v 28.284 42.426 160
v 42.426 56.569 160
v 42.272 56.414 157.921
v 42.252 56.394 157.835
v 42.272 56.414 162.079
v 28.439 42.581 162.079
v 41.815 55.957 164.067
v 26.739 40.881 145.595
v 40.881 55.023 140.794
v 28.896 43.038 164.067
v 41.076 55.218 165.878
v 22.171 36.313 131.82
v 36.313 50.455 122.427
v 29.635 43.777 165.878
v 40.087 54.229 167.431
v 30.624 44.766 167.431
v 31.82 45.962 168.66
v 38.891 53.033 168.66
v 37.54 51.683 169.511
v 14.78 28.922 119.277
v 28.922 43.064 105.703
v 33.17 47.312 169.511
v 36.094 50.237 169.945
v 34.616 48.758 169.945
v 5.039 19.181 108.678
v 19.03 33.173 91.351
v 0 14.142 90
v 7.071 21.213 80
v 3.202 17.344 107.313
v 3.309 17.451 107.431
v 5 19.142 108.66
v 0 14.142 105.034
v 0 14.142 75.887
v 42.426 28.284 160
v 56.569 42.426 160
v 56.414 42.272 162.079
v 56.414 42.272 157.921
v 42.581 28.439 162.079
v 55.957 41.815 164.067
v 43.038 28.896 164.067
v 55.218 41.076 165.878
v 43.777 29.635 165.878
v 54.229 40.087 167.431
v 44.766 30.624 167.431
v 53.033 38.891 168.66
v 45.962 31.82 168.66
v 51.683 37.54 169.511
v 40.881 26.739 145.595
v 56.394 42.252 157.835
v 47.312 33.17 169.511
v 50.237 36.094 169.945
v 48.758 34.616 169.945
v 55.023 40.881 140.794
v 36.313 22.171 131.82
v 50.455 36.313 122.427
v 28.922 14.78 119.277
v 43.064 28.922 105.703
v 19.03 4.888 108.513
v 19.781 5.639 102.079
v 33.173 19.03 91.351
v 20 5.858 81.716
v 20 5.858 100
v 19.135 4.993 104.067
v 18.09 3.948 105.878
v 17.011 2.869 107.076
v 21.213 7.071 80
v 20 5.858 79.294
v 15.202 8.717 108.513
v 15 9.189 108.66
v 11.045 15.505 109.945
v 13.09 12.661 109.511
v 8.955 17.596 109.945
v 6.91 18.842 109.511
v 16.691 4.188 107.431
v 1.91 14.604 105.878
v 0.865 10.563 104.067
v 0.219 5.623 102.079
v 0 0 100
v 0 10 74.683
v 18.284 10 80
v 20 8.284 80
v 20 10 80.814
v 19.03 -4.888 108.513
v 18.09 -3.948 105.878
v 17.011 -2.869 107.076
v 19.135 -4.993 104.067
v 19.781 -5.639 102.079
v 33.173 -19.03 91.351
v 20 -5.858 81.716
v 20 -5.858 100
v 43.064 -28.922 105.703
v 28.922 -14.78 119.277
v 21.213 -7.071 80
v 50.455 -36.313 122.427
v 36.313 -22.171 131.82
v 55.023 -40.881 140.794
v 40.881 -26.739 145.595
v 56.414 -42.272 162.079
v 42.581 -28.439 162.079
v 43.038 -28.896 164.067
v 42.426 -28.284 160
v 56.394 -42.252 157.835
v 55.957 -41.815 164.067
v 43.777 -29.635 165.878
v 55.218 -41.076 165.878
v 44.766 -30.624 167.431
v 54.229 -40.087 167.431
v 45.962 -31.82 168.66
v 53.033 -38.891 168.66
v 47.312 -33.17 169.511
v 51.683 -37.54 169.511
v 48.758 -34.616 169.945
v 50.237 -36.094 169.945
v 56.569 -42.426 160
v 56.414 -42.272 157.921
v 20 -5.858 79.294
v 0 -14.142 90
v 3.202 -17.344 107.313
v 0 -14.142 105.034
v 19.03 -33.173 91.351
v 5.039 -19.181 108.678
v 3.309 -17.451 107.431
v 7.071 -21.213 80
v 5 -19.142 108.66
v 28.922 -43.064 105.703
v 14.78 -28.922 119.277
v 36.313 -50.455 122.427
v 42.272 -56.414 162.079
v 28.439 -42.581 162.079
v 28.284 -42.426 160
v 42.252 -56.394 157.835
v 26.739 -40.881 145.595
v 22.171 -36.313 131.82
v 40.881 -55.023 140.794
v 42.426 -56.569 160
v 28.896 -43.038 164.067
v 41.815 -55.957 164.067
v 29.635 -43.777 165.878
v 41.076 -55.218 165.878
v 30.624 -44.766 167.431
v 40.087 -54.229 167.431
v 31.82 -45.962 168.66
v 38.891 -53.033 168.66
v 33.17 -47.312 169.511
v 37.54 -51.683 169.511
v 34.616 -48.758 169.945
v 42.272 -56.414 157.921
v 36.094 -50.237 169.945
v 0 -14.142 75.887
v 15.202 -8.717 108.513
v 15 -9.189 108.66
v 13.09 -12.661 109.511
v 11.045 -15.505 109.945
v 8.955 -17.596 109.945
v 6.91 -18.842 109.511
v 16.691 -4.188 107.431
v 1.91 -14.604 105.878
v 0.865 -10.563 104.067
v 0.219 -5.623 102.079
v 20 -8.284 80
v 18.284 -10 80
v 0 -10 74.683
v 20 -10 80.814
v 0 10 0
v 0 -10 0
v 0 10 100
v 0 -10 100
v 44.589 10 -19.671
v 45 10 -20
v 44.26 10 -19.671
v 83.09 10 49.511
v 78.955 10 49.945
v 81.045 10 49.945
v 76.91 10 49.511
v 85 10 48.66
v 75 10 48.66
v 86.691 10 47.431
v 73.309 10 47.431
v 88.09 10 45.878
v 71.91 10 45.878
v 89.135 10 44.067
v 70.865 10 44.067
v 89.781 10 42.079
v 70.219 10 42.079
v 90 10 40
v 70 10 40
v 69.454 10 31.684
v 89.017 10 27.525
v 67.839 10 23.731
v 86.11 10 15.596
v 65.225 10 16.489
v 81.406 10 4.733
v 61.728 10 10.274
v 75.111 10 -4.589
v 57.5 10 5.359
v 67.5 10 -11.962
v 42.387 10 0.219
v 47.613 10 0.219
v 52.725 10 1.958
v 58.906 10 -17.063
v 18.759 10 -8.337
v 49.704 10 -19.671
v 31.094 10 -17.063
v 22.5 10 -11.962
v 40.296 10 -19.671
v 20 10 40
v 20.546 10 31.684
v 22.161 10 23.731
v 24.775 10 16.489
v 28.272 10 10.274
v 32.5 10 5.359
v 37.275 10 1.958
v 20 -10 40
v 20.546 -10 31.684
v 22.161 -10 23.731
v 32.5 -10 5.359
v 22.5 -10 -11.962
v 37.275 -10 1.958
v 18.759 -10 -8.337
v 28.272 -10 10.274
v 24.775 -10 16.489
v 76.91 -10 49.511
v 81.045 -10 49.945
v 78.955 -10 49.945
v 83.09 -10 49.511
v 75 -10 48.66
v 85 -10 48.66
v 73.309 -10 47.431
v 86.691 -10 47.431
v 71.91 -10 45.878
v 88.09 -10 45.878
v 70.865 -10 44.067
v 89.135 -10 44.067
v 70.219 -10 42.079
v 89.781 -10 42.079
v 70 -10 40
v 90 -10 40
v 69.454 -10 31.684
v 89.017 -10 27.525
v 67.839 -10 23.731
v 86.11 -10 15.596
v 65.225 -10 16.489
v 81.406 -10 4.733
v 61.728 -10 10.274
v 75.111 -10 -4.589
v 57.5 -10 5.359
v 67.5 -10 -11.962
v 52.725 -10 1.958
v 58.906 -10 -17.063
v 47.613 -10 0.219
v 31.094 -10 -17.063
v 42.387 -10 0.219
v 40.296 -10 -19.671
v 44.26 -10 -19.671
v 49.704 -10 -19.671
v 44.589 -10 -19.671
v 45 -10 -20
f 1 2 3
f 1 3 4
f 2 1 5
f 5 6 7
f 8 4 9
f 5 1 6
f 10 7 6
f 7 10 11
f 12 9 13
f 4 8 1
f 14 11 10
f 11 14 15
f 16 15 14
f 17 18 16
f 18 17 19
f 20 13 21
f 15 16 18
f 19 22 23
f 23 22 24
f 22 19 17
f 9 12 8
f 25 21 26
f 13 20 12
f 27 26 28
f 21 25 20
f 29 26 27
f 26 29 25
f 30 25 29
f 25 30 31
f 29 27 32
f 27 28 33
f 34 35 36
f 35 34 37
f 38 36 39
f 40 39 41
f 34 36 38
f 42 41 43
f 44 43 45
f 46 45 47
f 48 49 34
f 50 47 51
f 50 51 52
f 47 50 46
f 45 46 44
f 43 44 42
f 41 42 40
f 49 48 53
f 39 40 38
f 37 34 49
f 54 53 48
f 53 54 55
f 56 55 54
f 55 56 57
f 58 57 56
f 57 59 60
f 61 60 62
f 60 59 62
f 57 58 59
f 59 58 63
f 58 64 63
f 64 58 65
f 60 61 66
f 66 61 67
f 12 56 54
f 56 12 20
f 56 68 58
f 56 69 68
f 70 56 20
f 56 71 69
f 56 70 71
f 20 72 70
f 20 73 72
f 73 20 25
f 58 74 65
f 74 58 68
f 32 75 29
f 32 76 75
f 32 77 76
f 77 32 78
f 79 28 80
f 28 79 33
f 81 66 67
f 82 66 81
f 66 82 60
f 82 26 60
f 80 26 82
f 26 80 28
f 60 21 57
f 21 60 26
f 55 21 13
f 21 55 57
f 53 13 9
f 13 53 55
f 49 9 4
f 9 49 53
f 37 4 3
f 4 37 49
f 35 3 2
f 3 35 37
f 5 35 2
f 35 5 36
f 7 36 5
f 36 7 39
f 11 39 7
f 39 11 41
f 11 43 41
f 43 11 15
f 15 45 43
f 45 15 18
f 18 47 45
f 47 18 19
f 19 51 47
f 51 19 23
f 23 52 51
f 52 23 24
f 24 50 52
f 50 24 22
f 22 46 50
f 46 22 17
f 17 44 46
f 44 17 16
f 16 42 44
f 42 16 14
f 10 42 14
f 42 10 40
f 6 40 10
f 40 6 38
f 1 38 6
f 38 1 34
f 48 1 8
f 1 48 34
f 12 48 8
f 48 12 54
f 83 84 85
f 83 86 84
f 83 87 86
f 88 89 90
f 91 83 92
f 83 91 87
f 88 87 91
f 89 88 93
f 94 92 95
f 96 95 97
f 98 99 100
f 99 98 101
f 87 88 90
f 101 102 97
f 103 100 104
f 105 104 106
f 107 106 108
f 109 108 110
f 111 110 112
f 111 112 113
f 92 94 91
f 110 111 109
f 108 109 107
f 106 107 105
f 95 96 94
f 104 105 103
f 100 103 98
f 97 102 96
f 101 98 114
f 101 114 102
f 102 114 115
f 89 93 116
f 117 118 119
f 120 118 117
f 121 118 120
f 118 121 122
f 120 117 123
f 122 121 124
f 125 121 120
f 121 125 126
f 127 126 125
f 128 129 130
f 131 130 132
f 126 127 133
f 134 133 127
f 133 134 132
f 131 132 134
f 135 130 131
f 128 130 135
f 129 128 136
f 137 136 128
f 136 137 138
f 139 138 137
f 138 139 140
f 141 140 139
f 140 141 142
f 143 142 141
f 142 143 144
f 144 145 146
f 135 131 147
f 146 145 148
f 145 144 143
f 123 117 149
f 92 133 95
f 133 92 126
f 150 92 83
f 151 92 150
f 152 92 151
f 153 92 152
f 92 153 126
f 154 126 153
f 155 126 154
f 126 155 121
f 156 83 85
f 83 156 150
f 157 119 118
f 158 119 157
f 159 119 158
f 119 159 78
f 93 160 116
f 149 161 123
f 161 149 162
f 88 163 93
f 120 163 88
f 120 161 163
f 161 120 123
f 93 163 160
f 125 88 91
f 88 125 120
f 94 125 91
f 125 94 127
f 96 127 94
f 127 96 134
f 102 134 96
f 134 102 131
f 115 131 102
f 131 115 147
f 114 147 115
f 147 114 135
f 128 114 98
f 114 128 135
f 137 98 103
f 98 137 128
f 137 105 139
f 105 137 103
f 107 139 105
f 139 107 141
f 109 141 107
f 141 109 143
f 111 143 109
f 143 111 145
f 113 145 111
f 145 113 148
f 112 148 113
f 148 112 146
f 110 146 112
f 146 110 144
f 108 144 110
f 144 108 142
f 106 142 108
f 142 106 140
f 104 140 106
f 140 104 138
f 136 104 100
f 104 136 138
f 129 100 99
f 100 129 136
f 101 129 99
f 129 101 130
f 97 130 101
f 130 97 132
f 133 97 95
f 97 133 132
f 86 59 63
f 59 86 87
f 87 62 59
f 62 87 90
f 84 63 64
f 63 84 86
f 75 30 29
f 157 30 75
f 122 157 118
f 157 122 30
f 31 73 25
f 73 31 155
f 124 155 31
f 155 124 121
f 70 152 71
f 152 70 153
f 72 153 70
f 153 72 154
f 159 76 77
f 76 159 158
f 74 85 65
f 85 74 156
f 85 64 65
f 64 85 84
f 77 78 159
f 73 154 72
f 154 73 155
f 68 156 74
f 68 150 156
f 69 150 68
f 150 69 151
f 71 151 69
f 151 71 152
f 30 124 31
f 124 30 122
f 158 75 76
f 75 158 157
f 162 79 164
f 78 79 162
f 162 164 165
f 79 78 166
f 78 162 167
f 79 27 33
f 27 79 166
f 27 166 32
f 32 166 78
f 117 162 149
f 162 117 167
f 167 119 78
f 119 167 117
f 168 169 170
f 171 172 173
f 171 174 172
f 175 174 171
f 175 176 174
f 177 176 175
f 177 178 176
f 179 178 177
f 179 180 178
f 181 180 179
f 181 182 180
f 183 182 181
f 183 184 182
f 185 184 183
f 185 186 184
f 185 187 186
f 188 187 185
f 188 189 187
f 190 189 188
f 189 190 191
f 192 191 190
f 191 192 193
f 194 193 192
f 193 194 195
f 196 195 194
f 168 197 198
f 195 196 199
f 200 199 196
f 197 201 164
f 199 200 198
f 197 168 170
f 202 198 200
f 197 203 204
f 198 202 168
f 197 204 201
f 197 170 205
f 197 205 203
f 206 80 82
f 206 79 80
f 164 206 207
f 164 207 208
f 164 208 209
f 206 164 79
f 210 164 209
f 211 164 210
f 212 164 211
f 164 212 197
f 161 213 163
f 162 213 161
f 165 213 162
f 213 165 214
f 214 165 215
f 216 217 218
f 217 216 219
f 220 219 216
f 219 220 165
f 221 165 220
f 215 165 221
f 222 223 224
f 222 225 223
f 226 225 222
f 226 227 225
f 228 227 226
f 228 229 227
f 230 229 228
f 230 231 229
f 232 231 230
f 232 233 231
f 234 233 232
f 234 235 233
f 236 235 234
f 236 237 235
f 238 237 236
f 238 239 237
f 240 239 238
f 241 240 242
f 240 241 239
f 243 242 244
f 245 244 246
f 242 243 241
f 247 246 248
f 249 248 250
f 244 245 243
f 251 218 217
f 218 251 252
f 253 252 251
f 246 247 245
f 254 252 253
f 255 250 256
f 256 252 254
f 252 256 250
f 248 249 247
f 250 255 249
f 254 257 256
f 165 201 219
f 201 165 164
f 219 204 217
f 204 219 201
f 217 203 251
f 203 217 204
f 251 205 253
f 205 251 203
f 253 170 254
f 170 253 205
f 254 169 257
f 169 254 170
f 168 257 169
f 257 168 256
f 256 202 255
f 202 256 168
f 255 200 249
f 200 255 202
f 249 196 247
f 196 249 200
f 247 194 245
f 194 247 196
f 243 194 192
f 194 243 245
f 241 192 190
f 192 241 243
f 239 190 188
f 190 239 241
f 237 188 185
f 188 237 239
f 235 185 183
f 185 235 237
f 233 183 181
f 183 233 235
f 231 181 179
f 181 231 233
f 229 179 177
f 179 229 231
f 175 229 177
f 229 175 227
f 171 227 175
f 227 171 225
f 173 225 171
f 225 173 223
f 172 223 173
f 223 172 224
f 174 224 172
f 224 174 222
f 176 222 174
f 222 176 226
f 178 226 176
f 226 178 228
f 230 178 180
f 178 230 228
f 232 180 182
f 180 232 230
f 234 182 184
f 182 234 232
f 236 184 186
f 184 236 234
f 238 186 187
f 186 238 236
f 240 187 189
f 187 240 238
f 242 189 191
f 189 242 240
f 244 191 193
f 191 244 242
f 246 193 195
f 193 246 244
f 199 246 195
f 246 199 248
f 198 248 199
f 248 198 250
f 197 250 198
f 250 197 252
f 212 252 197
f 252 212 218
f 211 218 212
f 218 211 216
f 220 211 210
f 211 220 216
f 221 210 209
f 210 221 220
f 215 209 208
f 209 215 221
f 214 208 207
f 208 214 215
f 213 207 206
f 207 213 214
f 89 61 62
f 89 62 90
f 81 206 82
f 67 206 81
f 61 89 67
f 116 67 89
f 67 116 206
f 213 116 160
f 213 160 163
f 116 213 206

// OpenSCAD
//
//  Copyright (C) 15-2-2013 Jasper den Ouden.
//
//  This is free software: you can redistribute it and/or modify
//  it under the terms of the GNU General Public License as published
//  by the Free Software Foundation, either version 3 of the License, or
//  (at your option) any later version.
//

//Very square-ish hook coat hanger.

h=100;
t=20;
d=50;
dh = 60;
a=45;

module upper_catch()
{
    difference()
    {
        intersection()
        {   square([d+t,h+dh]);
            translate([t-d,h+dh]) scale([1,(dh+t)/(sqrt(3)*d)]) circle(2*d);
        }
        translate([-d,h+dh]) scale([1,dh/(sqrt(3)*d)]) circle(2*d);
    }
    translate([d+t/2,h+dh]) circle(t/2);
}

module lower_catch()
{   translate([0,-t]) 
    {   difference() 
        {   intersection()
            {   square([d+2*t,dh]);
                translate([t+d/2,dh]) scale([(d/2+t)/dh,1]) circle(dh);
            }
            translate([t+d/2,dh]) scale([d/(2*(dh-t)),1]) circle(dh-t);
        }
        polygon([[0,t], [t,t], [t+d/2,0]]);
    }
    square([t,dh]);
    translate([d+1.5*t,dh-t]) circle(t/2);
}

module flat_hook2d()
{   square([t,h]);
    upper_catch();
    lower_catch();
}

module flat_hook()
{   linear_extrude(height=t) flat_hook2d(); }

module two_nose_hook()
{
    //TODO bull hook but two lower catches instead.
}

module bull_hook()
{ 
    translate([0,0,-t/2]) linear_extrude(height=t)
    {
        square([t,h]);
        lower_catch();
    }
    
    difference()
    {   union()
        {   translate([0,h]) rotate(a=a, v=[0,1]) translate([0,-h,-t/2])
                linear_extrude(height=t) upper_catch();
            translate([0,h]) rotate(a=-a, v=[0,1]) translate([0,-h,-t/2])
                linear_extrude(height=t) upper_catch();
            translate([t/2,h,-t]) cylinder(r=t/2,h=2*t);
        }
        translate([-4*h,0,0]) cube(8*h*[1,1,1], center=true);
        //Bit ugly way to get rid of cylinder bits.
        rotate(v=[0,1,0], a=a) translate([-4*h-t/2,0,0]) cube(8*h*[1,1,1], center=true);
        rotate(v=[0,1,0], a=-a) translate([-4*h-t/2,0,0]) cube(8*h*[1,1,1], center=true);
    }
}

rotate(v=[1,0,0], a=90) bull_hook();
